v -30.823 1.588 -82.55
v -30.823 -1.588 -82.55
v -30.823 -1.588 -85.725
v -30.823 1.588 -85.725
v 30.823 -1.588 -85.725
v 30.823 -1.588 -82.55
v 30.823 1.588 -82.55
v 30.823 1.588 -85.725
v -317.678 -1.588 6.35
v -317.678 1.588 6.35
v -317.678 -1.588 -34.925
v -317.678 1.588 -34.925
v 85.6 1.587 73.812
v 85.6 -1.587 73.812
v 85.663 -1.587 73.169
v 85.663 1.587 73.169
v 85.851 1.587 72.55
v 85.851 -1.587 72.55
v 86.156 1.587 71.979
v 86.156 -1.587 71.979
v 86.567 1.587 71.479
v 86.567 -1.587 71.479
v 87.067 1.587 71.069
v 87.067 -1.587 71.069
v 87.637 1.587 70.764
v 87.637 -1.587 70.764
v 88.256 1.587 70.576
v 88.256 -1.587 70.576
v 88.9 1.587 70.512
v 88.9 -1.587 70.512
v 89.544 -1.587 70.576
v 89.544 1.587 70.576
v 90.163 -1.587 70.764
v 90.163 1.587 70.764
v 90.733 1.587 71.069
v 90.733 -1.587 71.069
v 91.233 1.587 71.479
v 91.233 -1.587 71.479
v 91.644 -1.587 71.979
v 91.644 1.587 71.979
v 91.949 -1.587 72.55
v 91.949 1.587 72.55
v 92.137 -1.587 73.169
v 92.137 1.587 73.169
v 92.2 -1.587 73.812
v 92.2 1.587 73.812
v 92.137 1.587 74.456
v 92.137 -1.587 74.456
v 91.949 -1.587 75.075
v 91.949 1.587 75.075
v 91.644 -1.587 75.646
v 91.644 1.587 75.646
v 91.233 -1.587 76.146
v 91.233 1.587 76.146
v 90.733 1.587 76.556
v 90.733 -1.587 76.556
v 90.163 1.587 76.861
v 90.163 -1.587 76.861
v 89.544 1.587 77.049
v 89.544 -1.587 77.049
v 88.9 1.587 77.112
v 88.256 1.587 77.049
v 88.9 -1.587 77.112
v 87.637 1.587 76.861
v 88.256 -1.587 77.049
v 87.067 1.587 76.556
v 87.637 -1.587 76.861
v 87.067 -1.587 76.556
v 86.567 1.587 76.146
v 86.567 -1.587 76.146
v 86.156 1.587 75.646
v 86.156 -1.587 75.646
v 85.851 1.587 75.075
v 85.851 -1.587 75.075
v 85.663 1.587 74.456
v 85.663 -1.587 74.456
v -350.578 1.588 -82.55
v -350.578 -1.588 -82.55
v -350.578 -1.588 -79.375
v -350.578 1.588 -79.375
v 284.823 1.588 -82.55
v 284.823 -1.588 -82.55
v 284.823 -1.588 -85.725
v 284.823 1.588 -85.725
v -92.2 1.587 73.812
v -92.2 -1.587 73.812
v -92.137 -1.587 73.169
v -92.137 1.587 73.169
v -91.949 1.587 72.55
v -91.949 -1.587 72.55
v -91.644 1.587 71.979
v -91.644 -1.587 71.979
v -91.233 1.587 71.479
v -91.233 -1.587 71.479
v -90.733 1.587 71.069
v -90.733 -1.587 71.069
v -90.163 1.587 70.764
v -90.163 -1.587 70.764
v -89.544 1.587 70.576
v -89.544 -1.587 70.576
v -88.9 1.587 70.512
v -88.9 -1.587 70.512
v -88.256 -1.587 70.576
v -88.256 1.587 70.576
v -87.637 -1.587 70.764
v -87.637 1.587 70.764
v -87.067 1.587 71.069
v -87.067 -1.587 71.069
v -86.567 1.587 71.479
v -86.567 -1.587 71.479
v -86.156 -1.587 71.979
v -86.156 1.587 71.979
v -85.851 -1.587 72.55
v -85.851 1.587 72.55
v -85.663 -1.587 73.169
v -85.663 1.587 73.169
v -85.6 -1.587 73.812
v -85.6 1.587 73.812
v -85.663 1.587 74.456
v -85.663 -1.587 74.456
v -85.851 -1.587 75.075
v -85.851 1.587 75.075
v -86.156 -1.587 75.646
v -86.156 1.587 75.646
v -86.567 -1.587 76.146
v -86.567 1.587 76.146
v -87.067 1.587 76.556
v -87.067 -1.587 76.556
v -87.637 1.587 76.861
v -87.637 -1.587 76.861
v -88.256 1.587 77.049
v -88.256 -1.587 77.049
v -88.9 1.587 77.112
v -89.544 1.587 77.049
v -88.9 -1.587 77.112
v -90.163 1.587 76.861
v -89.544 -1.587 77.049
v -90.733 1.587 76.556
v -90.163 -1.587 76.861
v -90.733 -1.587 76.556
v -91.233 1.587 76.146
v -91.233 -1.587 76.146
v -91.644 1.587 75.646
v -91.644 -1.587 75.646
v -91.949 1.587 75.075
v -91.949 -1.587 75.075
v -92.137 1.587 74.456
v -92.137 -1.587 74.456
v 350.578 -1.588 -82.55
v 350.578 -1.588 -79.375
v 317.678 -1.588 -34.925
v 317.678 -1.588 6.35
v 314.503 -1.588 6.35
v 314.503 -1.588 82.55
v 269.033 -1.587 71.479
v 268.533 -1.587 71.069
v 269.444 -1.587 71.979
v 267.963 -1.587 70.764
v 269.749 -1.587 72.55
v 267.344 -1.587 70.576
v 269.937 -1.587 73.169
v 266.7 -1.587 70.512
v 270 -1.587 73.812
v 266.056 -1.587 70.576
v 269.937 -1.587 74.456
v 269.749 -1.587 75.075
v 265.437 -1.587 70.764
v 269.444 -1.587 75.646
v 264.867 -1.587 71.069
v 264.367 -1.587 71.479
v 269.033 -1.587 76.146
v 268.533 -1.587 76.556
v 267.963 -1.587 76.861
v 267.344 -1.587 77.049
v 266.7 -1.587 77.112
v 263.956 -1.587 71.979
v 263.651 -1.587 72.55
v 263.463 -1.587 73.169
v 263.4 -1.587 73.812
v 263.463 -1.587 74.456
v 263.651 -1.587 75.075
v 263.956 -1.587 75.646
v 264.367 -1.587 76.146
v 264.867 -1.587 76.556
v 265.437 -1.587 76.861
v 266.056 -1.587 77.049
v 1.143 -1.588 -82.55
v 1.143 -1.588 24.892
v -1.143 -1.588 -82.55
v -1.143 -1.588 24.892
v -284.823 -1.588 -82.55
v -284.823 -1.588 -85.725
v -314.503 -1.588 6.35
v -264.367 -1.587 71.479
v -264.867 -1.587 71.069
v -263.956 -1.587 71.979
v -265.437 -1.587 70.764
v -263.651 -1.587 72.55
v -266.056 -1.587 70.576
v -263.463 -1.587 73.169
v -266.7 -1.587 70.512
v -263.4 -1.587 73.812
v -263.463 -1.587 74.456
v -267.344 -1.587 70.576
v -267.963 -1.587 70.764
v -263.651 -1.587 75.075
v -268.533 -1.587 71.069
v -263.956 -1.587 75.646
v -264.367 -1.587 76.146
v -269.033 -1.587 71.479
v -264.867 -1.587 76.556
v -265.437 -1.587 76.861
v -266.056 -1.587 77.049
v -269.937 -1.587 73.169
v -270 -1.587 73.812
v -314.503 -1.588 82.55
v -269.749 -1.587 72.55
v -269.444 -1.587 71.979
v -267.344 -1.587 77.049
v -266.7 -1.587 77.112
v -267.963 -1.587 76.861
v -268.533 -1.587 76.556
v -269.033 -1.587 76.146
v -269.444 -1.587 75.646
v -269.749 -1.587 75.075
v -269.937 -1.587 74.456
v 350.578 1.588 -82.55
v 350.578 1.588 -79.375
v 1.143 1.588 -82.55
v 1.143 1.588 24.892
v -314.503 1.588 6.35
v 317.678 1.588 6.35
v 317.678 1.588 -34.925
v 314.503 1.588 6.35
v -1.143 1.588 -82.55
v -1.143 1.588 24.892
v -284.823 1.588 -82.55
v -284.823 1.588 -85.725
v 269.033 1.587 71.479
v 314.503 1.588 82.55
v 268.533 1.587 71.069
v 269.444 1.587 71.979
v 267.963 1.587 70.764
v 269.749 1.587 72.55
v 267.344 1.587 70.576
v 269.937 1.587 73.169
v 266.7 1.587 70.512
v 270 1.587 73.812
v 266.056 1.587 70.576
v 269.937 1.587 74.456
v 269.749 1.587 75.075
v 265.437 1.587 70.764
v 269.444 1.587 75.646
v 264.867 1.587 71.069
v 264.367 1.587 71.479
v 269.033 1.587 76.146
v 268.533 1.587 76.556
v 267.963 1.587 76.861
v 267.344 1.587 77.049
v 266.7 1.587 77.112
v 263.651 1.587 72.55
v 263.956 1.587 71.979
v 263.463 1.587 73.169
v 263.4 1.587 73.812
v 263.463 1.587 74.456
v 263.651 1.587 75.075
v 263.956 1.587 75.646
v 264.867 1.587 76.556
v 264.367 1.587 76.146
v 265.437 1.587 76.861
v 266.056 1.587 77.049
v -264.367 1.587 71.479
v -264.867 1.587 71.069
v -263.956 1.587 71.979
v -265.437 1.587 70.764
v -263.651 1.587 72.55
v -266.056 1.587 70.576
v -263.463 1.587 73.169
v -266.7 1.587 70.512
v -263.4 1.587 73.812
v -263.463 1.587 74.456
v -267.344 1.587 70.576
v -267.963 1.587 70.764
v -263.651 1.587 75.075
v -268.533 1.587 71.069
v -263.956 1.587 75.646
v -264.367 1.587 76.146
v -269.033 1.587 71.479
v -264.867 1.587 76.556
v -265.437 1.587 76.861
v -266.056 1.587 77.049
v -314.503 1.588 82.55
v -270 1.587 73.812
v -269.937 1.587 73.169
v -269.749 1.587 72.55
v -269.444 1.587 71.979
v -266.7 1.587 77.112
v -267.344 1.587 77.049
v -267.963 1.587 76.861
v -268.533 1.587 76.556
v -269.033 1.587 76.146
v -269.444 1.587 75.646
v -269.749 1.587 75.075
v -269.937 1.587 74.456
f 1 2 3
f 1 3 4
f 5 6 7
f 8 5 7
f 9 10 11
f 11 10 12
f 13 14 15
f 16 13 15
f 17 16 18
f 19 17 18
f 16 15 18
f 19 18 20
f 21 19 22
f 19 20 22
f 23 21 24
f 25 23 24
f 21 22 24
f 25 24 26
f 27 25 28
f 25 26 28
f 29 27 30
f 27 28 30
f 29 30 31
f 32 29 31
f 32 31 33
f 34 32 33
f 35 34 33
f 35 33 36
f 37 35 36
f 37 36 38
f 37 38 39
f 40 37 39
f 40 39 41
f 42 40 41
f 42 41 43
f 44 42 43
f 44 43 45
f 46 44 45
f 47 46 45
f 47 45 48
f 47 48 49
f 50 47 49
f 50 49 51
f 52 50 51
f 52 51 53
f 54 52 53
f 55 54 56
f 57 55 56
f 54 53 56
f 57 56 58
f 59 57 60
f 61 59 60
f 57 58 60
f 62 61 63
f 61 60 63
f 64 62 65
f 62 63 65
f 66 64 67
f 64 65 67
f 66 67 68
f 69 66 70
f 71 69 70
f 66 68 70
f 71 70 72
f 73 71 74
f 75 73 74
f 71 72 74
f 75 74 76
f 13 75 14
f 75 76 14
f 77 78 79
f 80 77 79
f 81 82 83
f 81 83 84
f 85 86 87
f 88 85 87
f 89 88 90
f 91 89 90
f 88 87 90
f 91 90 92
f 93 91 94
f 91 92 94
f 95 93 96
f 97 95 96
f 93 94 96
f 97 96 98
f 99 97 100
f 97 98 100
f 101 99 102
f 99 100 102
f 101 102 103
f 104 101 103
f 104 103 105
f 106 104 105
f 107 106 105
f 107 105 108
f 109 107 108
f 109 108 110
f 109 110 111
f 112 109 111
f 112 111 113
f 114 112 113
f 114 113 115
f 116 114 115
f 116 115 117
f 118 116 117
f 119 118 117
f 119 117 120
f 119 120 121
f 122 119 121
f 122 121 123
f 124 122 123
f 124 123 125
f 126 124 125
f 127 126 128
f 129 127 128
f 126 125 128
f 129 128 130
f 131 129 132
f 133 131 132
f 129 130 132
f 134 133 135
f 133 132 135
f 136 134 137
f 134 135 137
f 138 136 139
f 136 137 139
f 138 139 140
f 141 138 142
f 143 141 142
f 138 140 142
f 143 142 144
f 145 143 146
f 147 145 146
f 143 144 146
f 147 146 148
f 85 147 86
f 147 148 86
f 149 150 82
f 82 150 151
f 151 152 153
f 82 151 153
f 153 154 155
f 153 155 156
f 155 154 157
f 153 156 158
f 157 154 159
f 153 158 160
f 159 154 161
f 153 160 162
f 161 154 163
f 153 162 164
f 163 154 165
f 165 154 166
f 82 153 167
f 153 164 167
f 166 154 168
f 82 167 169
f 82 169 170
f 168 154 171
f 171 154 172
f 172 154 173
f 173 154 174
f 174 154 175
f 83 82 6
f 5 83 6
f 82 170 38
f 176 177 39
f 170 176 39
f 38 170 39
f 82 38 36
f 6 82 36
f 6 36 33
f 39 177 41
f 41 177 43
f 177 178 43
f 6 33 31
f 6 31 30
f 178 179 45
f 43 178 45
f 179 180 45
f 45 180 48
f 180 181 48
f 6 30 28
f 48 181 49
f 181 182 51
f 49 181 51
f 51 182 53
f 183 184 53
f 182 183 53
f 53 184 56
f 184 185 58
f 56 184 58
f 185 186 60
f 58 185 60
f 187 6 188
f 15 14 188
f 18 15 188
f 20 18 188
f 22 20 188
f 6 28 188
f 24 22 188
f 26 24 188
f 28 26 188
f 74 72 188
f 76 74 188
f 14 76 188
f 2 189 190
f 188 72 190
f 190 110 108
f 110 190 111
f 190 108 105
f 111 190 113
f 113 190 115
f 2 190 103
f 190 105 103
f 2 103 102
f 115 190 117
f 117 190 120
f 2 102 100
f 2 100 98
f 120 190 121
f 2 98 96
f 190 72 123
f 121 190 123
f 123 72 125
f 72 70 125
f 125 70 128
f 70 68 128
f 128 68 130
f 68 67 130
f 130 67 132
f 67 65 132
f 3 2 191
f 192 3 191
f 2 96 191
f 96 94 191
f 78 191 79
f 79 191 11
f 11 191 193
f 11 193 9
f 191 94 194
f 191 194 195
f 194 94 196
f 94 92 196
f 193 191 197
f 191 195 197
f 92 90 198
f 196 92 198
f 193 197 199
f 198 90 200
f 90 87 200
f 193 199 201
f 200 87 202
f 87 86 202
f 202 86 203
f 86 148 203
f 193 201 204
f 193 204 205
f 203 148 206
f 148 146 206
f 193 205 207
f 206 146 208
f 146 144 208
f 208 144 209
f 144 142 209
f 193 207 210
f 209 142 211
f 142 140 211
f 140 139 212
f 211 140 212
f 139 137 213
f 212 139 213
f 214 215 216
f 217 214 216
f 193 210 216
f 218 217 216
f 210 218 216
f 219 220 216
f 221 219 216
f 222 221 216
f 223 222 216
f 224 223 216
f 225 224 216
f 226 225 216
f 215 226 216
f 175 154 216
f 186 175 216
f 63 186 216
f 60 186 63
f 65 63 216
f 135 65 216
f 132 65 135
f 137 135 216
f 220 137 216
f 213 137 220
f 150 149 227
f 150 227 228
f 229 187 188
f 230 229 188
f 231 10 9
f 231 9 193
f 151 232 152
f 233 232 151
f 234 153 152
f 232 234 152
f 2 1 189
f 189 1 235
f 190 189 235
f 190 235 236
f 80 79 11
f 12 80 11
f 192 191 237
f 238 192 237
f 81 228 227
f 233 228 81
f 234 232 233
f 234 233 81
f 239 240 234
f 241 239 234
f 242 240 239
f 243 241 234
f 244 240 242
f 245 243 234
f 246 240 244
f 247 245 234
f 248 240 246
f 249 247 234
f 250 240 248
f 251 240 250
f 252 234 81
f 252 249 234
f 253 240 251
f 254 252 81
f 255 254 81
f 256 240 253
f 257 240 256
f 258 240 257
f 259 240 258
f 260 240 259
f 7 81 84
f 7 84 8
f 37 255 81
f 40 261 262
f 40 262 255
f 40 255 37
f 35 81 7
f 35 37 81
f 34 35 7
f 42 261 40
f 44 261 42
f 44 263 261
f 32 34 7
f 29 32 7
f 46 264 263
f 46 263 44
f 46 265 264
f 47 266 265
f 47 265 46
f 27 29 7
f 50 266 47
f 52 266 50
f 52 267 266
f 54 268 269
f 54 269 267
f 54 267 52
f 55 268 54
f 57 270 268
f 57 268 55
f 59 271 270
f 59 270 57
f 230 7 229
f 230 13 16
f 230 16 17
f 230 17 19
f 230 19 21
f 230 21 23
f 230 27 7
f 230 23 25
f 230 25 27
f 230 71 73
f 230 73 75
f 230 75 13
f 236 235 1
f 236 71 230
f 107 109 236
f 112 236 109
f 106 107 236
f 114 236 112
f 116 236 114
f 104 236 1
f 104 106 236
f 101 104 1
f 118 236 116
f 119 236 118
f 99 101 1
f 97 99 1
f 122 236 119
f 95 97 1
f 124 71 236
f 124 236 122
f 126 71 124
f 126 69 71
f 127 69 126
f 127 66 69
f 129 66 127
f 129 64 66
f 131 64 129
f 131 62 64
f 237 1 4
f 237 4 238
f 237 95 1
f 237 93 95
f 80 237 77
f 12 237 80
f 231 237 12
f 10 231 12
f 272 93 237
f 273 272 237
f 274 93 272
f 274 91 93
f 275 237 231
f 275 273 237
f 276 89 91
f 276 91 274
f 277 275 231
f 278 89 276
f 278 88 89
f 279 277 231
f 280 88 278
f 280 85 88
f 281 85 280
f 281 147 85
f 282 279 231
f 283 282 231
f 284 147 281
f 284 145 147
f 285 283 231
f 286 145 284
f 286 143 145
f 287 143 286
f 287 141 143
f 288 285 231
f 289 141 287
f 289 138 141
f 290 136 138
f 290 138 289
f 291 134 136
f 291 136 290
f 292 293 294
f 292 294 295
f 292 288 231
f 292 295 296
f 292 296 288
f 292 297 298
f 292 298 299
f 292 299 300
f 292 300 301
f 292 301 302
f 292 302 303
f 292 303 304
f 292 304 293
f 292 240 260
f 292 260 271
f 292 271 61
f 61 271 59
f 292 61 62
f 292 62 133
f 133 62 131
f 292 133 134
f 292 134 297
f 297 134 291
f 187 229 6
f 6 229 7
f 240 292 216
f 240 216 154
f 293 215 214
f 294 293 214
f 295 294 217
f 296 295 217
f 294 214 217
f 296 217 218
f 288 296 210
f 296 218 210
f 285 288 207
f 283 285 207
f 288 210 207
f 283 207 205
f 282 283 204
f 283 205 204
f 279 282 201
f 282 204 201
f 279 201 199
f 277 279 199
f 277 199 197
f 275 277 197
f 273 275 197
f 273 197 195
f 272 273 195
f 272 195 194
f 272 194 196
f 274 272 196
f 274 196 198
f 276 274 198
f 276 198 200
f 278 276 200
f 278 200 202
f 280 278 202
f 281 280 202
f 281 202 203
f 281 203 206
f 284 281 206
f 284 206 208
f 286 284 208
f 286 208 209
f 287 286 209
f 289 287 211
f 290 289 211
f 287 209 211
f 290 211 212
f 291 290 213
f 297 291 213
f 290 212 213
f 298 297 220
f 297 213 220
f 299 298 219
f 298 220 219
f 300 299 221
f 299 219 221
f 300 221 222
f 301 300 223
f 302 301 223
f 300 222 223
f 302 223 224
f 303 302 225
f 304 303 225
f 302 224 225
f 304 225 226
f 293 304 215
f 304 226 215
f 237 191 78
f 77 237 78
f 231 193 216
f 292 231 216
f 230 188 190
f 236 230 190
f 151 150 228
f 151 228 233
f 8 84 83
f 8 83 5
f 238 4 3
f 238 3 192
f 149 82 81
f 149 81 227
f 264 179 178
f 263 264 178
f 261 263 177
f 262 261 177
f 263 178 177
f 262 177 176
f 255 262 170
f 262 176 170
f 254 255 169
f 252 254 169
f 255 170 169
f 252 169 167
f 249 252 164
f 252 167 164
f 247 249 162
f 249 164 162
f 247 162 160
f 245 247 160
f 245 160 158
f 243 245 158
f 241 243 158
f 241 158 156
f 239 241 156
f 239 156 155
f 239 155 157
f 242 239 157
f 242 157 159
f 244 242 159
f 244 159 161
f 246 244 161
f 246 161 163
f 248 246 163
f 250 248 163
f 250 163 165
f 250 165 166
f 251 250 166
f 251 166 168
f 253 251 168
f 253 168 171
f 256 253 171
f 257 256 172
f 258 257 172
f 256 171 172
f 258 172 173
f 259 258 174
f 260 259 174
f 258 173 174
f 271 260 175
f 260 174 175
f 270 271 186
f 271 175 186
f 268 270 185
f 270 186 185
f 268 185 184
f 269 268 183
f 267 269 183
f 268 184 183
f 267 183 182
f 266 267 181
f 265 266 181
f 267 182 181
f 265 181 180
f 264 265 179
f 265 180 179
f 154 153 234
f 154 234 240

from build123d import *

# Parameters (mm, degrees)
SKETCH1_W            = 635.3556
SKETCH1_H            = 165.1
BOSS_EXTRUDE1_DEPTH  = 1.5875
SKETCH2_W            = 254
SKETCH2_H            = 3.175
BOSS_EXTRUDE2_DEPTH  = 3.175
BOSS_EXTRUDE3_DEPTH  = 3.175
SKETCH5_W            = 1.143
SKETCH5_H            = 107.442
SKETCH5_W_2          = 3.175
SKETCH5_H_2          = 76.2
CUT_EXTRUDE2_DEPTH   = 361.921161502
M6_CLEARANCE_HOLE1_D = 6.6
LPATTERN2_COUNT      = 4
LPATTERN2_PITCH      = 177.8


with BuildPart() as part:
    # Sketch1 → Boss-Extrude1 (new, symmetric)
    with BuildSketch(Plane(origin=(0, 0, 0), x_dir=(1, 0, 0), z_dir=(0, 1, 0))):
        Rectangle(SKETCH1_W, SKETCH1_H)
    extrude(amount=BOSS_EXTRUDE1_DEPTH, both=True)

    # Sketch2 → Boss-Extrude2 (add)
    with BuildSketch(Plane(origin=(0, 0, -82.55), x_dir=(-1, 0, 0), z_dir=(0, 0, -1))):
        with Locations((-157.8229, 0)):
            Rectangle(SKETCH2_W, SKETCH2_H)
        with Locations((157.8229, 0)):
            Rectangle(SKETCH2_W, SKETCH2_H)
    extrude(amount=BOSS_EXTRUDE2_DEPTH)

    # Sketch3 → Boss-Extrude3 (add)
    with BuildSketch(Plane.XZ.offset(1.5875)):
        Polygon((317.6778, -82.55), (350.57842, -82.55), (350.57842, -79.375), (317.6778, -34.925), align=None)
    boss_extrude3 = extrude(amount=-BOSS_EXTRUDE3_DEPTH)

    # Mirror1: Boss-Extrude3 across plane
    add(boss_extrude3.mirror(Plane(origin=(0, 0, 0), x_dir=(0, 0, 1), z_dir=(1, 0, 0))))

    # Sketch5 → Cut-Extrude2 (cut, through all)
    with BuildSketch(Plane.XZ.offset(1.5875)):
        with Locations((0.5715, -28.829)):
            Rectangle(SKETCH5_W, SKETCH5_H)
        with Locations((-0.5715, -28.829)):
            Rectangle(SKETCH5_W, SKETCH5_H)
        with Locations((-316.0903, 44.45)):
            Rectangle(SKETCH5_W_2, SKETCH5_H_2)
        with Locations((316.0903, 44.45)):
            Rectangle(SKETCH5_W_2, SKETCH5_H_2)
    extrude(amount=-CUT_EXTRUDE2_DEPTH, mode=Mode.SUBTRACT)

    # M6 Clearance Hole1 (through all)
    with Locations(Plane(origin=(0, 1.5875, 0), x_dir=(1, 0, 0), z_dir=(0, 1, 0))):
        with Locations((266.7, -73.8124)):
            m6_clearance_hole1 = Hole(M6_CLEARANCE_HOLE1_D / 2)

    # LPattern2: M6 Clearance Hole1 ×4
    with Locations(*[(-i * LPATTERN2_PITCH, 0, 0) for i in range(1, LPATTERN2_COUNT)]):
        add(m6_clearance_hole1, mode=Mode.SUBTRACT)


solid = part.part
